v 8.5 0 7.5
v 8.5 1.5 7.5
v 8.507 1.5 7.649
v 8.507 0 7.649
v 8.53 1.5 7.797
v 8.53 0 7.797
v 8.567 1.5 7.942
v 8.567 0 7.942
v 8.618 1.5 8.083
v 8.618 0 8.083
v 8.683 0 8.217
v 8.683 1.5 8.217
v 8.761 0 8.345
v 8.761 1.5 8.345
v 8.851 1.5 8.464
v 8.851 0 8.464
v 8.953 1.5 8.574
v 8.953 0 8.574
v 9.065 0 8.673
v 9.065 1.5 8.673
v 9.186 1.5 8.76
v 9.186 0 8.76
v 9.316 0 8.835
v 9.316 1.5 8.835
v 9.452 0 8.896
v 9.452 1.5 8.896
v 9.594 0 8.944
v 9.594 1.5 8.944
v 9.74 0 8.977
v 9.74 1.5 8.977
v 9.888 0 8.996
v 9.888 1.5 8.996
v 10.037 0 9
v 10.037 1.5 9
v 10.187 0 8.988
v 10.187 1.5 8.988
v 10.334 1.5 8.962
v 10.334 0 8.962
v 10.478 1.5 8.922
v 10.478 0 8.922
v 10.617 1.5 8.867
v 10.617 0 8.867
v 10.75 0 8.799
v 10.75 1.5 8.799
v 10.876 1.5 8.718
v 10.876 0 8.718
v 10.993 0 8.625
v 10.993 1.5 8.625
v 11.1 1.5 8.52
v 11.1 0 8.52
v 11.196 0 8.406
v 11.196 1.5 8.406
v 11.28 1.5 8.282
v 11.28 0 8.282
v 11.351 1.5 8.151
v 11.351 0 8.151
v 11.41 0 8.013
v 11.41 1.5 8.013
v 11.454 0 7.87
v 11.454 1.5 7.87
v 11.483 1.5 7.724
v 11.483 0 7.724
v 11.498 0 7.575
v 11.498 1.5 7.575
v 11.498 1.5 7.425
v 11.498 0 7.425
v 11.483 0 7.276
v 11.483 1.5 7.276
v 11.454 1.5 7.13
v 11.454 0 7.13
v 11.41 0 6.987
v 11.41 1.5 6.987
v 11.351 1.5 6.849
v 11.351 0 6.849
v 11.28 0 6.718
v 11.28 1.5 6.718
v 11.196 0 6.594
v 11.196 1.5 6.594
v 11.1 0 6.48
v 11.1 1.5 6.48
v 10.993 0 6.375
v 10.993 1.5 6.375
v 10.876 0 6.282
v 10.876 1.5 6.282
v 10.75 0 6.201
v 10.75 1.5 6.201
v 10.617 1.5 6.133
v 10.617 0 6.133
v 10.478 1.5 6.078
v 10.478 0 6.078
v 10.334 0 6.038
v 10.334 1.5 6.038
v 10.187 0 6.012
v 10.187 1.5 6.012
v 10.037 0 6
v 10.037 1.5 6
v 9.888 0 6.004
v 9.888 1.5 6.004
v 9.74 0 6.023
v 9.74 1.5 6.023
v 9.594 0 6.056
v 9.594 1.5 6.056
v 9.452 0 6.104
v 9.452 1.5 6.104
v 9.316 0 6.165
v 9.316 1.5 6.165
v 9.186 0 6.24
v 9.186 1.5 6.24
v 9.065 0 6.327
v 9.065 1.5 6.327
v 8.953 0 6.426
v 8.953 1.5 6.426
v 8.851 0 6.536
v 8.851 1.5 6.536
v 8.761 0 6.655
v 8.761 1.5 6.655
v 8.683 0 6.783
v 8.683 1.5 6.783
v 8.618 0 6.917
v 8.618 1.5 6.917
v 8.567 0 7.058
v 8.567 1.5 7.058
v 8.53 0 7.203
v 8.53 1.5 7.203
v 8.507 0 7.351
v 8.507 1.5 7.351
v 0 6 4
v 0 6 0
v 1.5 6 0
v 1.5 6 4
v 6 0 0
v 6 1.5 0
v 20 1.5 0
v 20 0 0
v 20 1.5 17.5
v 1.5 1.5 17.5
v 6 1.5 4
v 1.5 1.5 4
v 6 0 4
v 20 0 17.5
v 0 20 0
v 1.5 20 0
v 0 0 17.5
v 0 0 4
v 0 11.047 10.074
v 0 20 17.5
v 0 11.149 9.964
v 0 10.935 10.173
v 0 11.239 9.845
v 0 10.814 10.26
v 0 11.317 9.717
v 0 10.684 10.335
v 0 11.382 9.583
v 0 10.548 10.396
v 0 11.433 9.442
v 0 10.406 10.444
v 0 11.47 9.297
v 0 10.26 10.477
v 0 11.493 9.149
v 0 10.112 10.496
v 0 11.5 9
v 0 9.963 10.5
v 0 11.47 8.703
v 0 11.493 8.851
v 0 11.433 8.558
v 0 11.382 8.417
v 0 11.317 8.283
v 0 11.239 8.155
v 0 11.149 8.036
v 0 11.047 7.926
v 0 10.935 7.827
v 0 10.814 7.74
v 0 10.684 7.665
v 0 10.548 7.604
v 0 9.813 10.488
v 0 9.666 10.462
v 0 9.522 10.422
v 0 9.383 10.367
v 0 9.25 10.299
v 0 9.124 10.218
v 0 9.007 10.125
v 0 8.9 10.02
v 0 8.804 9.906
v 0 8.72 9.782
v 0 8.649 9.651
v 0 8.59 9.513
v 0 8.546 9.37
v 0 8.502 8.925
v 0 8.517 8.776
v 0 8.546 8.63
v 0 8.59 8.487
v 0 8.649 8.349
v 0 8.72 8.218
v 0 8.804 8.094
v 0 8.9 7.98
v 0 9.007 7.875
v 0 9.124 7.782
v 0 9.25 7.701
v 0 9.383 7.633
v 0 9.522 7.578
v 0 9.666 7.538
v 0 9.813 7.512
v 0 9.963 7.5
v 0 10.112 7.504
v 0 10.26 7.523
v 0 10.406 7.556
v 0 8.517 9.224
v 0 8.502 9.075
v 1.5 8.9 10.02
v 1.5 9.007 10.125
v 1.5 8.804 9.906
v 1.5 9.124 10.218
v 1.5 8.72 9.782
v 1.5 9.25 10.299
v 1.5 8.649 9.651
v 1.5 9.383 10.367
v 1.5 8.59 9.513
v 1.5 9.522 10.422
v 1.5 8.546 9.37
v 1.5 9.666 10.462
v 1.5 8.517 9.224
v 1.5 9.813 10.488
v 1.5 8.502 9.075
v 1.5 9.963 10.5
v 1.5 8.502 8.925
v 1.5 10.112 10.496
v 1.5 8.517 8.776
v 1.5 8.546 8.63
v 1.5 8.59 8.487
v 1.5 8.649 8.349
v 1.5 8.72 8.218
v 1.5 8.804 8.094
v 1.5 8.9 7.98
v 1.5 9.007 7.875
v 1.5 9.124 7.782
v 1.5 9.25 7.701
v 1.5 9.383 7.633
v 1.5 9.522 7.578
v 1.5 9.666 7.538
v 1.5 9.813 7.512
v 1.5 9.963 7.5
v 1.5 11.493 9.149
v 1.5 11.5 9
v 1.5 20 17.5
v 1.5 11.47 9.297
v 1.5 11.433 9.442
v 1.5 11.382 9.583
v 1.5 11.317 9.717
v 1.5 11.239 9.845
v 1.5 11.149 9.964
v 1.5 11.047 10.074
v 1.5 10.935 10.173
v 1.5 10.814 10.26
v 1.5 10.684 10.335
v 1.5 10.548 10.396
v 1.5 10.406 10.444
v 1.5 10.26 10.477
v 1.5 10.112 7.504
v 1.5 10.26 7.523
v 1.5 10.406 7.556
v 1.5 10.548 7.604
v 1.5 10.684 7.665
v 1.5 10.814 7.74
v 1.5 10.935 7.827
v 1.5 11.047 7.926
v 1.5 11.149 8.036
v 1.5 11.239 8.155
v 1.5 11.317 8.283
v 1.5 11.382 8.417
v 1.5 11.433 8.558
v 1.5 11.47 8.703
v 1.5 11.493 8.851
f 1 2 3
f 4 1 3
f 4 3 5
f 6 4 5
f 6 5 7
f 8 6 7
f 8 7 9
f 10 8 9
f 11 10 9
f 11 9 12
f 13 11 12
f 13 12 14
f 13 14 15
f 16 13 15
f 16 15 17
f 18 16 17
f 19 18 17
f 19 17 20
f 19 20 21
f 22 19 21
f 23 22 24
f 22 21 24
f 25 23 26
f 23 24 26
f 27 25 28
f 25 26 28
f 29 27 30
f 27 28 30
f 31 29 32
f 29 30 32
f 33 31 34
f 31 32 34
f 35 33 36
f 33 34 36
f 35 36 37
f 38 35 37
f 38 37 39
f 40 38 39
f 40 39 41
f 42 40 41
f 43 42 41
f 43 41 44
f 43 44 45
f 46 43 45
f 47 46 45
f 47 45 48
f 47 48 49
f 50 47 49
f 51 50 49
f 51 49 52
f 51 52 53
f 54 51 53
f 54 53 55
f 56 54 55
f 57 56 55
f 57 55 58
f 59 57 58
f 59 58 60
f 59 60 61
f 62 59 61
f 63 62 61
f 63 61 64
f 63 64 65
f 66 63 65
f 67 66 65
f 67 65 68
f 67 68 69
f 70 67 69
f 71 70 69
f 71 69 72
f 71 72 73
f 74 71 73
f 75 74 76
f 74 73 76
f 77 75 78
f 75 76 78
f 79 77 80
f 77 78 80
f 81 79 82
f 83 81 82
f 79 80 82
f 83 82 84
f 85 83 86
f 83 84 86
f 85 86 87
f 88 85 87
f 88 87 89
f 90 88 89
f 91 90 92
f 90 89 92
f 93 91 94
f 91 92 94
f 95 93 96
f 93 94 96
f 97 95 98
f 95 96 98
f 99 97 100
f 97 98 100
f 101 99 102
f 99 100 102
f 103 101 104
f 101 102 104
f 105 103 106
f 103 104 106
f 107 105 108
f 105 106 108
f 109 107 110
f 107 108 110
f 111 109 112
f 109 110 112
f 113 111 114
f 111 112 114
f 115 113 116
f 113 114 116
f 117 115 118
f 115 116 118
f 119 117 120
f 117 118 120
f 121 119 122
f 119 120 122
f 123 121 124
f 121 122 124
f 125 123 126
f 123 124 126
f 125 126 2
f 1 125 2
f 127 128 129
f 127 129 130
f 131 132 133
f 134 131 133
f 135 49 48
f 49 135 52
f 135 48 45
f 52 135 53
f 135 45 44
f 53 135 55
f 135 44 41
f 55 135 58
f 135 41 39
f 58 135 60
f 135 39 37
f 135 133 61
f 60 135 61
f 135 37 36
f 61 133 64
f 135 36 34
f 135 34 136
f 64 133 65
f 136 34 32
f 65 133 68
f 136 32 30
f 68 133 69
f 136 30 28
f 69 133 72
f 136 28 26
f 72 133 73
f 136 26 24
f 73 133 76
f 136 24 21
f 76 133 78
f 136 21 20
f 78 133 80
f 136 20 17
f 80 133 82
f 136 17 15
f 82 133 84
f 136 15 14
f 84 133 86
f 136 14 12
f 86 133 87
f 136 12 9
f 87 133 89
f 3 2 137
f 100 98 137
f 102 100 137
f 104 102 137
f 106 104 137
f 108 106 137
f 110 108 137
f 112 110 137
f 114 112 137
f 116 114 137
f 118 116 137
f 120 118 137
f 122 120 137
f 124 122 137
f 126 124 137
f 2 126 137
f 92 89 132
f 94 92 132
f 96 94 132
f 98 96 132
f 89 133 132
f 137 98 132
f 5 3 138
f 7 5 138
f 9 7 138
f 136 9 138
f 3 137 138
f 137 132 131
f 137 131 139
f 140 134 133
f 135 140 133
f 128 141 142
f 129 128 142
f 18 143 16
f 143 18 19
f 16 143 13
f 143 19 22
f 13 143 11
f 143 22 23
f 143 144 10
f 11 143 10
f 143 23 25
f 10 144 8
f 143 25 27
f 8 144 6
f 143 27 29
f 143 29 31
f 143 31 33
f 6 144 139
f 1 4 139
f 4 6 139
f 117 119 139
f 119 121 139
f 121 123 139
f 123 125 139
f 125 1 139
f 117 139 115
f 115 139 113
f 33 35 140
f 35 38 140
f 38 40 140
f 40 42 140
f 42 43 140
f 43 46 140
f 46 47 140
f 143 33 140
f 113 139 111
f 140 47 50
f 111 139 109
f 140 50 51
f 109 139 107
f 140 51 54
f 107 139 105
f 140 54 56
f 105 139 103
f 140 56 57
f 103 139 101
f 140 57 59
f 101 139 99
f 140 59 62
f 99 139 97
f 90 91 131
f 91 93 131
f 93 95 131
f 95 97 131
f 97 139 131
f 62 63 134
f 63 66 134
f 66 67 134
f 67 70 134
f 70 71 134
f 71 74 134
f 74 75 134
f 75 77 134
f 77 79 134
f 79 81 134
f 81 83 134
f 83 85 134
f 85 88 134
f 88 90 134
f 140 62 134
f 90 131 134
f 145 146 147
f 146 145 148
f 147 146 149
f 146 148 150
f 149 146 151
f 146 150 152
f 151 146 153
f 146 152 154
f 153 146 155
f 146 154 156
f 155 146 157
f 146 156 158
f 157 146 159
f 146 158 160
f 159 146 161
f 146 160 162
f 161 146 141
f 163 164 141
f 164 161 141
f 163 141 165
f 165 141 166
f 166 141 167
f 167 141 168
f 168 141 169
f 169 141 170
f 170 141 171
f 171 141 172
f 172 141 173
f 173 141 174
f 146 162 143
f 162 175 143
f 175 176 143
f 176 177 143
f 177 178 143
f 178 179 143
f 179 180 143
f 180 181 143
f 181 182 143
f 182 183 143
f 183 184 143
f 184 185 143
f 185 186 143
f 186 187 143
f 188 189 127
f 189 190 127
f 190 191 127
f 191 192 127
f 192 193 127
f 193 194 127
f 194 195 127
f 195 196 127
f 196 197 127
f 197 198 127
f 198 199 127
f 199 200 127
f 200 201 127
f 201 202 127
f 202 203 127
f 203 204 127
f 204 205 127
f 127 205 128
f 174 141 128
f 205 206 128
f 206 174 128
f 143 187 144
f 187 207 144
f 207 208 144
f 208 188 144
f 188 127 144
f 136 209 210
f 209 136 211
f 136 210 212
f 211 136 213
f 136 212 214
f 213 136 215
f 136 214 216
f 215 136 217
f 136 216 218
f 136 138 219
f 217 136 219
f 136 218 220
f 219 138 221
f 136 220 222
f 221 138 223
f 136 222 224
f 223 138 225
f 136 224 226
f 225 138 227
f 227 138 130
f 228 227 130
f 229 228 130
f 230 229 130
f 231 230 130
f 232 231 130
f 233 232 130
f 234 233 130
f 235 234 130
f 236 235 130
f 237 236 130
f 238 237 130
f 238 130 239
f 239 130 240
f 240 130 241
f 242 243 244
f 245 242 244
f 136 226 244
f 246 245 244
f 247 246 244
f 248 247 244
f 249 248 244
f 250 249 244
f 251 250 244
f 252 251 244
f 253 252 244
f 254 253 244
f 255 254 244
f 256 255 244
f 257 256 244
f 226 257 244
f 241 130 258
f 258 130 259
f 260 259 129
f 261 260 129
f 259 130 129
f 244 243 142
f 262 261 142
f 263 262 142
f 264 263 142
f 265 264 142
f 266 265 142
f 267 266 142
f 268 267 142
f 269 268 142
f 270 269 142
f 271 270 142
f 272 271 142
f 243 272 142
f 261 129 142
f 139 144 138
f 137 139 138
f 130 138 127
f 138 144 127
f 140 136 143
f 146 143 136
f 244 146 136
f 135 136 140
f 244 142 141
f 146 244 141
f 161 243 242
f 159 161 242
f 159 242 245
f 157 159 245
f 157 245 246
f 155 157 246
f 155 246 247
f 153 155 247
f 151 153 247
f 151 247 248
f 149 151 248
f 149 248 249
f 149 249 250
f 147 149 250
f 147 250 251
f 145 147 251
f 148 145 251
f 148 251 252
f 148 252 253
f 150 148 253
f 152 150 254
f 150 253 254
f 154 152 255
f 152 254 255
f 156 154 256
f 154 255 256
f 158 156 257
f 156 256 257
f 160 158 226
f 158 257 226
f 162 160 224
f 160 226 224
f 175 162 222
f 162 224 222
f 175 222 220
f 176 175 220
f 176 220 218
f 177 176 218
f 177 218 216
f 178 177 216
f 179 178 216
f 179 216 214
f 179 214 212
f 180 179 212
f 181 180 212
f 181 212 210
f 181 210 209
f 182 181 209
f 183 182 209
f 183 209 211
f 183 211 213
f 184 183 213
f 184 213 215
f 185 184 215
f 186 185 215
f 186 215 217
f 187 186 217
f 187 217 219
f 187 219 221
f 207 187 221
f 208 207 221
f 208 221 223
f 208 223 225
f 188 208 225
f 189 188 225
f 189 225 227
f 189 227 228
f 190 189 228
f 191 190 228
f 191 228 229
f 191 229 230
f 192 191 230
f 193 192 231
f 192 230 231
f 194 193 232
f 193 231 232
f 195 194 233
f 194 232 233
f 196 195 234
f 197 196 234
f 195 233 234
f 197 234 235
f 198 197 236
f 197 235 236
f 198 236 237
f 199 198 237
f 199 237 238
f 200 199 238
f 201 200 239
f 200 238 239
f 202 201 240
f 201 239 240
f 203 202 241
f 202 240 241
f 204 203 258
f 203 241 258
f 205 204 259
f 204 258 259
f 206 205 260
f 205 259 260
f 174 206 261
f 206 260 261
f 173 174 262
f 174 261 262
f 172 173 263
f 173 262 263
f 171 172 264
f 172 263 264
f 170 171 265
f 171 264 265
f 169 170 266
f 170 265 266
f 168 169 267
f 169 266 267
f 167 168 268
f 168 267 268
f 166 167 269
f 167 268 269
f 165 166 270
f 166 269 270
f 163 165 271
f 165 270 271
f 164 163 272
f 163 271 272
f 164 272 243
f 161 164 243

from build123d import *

# Parameters (mm, degrees)
EXTRUSION1_DEPTH = 17.5
ESQUISSE7_R      = 1.5
EXTRUSION7_DEPTH = 33.380549717
ESQUISSE9_R      = 1.5
EXTRUSION8_DEPTH = 33.380549717
ESQUISSE10_W     = 4
ESQUISSE10_H     = 6
EXTRUSION9_DEPTH = 6


with BuildPart() as part:
    # Esquisse1 → Extrusion1 (new body)
    with BuildSketch(Plane.XY):
        Polygon((0, 0), (20, 0), (20, 1.5), (1.5, 1.5), (1.5, 20), (0, 20), align=None)
    extrude(amount=EXTRUSION1_DEPTH)

    # Esquisse7 → Extrusion7 (cut, through all)
    with BuildSketch(Plane(origin=(0, 1.5, 0), x_dir=(-1, 0, 0), z_dir=(0, 1, 0))):
        with Locations((-10, 7.5)):
            Circle(ESQUISSE7_R)
    extrude(amount=-EXTRUSION7_DEPTH, mode=Mode.SUBTRACT)

    # Esquisse9 → Extrusion8 (cut, through all)
    with BuildSketch(Plane(origin=(1.5, 0, 0), x_dir=(0, 0, -1), z_dir=(1, 0, 0))):
        with Locations(Location((-9, 10, 0), (0, 0, 90))):
            Circle(ESQUISSE9_R)
    extrude(amount=-EXTRUSION8_DEPTH, mode=Mode.SUBTRACT)

    # Esquisse10 → Extrusion9 (cut)
    with BuildSketch(Plane.ZY):
        with Locations((2, 3)):
            Rectangle(ESQUISSE10_W, ESQUISSE10_H)
    extrude(amount=-EXTRUSION9_DEPTH, mode=Mode.SUBTRACT)


solid = part.part
